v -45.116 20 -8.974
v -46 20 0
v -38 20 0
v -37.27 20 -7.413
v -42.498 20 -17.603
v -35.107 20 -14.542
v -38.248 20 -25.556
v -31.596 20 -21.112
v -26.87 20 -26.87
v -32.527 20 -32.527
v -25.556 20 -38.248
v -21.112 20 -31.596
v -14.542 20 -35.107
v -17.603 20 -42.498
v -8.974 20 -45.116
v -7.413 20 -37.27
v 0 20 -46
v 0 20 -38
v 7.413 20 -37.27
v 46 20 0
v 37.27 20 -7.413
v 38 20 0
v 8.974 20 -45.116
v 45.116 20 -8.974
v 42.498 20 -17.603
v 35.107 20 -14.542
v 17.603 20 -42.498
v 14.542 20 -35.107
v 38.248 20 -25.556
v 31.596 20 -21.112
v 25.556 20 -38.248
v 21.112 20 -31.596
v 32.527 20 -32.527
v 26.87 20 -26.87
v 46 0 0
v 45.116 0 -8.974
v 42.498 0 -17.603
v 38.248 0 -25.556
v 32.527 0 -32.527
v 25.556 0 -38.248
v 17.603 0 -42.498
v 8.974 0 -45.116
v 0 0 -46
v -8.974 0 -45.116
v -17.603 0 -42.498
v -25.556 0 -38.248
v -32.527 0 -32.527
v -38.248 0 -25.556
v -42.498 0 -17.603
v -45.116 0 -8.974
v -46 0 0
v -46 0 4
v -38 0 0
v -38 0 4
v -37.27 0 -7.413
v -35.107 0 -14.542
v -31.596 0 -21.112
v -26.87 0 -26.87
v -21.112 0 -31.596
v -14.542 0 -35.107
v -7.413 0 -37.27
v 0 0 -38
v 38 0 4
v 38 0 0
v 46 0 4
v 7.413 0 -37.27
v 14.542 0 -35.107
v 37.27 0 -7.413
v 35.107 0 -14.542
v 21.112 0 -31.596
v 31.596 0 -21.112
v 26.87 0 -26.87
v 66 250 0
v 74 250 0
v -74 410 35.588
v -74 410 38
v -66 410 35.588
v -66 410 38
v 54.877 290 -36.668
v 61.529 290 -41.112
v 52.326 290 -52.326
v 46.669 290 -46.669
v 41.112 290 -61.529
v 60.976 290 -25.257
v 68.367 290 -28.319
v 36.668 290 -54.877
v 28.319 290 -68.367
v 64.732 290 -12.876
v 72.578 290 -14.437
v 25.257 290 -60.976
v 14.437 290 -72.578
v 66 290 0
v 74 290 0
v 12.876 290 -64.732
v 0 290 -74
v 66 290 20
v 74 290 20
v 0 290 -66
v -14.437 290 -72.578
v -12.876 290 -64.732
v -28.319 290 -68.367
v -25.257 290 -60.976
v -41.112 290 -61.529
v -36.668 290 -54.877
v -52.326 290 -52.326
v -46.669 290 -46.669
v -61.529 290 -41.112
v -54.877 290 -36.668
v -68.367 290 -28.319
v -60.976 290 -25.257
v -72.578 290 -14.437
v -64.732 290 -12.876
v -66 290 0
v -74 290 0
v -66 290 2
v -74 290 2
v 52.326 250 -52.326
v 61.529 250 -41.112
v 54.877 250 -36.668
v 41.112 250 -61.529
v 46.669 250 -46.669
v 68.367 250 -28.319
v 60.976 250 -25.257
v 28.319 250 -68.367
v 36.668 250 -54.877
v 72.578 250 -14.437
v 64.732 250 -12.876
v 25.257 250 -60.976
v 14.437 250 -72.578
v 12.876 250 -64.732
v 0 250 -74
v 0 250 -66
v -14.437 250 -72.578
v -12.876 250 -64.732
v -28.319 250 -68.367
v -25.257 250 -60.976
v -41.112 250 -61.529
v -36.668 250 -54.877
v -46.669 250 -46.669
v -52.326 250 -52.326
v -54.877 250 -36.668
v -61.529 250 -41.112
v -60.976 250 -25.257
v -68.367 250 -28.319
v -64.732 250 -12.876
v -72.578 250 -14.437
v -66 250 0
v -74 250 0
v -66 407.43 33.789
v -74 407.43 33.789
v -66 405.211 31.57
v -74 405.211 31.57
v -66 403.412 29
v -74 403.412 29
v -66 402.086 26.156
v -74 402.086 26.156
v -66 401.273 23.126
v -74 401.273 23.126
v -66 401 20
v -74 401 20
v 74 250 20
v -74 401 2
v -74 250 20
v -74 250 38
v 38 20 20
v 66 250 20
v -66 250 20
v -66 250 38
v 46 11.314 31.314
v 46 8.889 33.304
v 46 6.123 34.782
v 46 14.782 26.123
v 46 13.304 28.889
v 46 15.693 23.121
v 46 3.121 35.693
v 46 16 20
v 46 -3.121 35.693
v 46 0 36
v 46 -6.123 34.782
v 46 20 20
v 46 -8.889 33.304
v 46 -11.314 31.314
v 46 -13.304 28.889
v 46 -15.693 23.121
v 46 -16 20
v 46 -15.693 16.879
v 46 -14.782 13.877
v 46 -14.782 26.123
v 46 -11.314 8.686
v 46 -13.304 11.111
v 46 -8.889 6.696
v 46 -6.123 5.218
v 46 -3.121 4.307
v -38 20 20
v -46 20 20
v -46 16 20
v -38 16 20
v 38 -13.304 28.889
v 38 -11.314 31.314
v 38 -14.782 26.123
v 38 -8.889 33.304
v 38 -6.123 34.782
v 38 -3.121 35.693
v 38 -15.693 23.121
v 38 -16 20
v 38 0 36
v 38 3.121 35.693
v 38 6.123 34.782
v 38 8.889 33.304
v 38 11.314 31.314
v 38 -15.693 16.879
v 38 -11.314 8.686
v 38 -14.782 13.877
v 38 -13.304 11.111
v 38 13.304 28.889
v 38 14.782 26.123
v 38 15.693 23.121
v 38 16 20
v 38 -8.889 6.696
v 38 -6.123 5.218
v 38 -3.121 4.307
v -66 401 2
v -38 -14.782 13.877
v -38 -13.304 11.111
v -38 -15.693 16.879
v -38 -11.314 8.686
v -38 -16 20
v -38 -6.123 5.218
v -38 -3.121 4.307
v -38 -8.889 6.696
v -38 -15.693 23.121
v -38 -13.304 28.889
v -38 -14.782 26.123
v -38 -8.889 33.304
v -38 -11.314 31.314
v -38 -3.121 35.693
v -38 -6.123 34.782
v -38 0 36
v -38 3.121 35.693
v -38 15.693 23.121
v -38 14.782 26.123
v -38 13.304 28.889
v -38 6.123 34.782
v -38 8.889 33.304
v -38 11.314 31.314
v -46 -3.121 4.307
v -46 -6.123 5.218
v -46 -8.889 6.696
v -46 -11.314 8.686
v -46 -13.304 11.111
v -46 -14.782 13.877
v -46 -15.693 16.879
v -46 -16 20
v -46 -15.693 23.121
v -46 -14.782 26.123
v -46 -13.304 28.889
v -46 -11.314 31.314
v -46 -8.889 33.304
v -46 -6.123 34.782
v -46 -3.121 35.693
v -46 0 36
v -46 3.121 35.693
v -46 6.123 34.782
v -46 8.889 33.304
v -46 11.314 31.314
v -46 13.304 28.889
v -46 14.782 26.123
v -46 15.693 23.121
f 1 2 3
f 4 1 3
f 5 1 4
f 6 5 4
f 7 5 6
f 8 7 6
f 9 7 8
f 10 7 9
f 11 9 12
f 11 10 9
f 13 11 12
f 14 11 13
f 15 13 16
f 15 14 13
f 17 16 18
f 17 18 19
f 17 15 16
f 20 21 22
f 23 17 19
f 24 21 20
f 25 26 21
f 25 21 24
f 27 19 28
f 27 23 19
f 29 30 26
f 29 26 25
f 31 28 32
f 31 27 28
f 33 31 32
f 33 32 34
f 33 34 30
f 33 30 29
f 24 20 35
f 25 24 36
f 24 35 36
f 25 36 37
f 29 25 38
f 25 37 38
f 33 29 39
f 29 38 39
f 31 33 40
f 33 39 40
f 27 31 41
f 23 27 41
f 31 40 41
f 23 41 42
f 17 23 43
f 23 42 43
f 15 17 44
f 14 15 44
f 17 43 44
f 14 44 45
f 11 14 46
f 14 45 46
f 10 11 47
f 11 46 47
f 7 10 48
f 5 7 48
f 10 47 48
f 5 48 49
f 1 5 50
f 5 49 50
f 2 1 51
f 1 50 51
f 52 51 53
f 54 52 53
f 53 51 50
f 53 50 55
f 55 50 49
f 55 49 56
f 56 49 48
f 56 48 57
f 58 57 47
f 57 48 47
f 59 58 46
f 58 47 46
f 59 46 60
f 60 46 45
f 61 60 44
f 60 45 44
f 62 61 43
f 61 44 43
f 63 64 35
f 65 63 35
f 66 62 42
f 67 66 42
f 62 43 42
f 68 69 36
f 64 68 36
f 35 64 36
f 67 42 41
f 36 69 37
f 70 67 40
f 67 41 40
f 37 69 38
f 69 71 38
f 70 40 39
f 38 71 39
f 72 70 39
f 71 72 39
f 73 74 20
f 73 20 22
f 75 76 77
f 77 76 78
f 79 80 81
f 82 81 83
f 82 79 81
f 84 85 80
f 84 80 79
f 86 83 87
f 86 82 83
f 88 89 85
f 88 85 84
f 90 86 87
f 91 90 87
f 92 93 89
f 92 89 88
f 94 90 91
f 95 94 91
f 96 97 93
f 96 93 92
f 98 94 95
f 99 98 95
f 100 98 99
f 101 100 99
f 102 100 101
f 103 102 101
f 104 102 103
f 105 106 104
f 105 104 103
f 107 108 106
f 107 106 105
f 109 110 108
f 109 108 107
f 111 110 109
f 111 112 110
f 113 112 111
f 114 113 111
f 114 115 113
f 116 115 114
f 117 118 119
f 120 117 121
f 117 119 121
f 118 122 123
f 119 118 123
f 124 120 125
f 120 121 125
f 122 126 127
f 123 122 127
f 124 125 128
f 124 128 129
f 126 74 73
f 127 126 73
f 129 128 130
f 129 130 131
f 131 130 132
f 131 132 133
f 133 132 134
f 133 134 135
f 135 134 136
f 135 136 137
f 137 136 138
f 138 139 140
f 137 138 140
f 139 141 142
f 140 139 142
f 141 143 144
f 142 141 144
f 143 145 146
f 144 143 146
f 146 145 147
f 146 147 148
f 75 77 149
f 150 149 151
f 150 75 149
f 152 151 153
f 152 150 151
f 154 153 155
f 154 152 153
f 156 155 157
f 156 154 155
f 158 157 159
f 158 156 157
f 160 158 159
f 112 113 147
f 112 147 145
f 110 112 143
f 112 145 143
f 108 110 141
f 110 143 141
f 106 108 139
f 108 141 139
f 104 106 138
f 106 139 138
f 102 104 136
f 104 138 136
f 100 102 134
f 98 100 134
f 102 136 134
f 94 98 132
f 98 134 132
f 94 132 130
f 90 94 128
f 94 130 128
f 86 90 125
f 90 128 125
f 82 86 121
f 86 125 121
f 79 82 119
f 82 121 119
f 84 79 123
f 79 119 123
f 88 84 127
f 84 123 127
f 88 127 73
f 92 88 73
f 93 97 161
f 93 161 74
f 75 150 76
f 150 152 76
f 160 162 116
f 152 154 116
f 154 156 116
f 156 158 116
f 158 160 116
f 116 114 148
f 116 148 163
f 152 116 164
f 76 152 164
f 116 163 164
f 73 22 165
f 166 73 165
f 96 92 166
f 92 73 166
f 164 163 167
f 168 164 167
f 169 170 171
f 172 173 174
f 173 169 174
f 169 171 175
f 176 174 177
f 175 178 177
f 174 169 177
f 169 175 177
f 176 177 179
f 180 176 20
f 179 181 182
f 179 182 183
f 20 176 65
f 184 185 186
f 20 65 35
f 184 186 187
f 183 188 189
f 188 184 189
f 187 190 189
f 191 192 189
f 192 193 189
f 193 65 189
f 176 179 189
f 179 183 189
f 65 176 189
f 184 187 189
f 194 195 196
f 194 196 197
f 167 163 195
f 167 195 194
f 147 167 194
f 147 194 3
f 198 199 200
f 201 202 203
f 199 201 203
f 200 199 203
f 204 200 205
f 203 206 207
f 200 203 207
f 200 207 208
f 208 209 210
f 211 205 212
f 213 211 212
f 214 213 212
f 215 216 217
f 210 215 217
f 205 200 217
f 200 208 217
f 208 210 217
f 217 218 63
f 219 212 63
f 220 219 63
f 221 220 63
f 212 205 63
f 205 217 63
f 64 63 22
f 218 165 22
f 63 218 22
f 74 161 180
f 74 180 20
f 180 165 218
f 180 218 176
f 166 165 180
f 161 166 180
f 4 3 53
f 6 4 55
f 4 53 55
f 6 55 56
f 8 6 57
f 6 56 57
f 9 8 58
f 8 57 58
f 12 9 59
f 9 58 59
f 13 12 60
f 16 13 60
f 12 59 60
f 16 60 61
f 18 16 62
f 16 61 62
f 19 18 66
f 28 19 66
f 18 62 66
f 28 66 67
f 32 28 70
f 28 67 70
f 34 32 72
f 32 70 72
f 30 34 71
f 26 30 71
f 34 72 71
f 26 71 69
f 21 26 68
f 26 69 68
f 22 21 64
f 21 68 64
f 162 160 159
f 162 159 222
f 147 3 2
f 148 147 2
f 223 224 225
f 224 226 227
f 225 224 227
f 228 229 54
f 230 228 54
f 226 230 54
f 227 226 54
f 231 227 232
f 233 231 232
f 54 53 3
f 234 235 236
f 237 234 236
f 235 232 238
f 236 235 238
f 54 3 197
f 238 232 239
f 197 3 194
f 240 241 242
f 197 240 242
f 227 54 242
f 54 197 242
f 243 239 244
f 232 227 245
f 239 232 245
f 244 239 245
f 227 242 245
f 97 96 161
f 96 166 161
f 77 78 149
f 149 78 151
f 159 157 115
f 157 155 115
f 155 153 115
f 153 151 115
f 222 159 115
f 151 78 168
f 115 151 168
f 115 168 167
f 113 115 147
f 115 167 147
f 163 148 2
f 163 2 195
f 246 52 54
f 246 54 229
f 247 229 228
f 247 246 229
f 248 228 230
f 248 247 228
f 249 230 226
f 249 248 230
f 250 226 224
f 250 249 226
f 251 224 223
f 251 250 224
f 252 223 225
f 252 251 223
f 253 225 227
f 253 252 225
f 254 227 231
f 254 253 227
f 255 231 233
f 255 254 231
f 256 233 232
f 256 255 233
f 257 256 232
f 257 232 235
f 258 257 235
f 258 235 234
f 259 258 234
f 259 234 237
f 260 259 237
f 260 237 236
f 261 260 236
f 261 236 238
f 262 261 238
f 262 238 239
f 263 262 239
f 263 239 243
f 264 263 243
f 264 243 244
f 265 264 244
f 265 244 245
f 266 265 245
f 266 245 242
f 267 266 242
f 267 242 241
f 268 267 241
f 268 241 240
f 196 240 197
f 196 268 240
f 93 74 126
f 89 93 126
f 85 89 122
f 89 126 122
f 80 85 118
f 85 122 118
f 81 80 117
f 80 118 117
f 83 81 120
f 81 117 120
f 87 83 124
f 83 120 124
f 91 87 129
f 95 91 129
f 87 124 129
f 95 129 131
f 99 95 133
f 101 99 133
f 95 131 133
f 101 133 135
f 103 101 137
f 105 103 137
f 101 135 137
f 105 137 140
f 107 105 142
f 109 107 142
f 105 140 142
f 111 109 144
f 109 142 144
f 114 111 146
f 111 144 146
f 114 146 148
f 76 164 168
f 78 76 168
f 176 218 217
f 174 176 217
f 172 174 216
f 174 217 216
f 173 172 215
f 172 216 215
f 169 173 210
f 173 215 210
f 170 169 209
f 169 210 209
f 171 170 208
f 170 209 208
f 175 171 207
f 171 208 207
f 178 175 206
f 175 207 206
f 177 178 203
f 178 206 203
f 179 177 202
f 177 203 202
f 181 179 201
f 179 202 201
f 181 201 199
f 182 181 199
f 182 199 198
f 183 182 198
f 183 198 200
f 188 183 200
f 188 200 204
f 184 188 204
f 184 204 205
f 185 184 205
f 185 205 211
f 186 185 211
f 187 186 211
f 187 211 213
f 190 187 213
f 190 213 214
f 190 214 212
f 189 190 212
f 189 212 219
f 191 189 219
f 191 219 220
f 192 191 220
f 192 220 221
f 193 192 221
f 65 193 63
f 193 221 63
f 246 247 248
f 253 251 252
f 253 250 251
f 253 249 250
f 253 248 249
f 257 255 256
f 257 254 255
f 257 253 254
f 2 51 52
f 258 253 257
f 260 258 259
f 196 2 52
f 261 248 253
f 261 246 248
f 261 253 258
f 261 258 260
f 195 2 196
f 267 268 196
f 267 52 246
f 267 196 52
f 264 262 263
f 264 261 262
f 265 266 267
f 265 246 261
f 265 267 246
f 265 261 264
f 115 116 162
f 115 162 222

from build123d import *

# Parameters (mm, degrees)
EXTRUDE_1_DEPTH     = 20
SKETCH_3_R          = 16
EXTRUDE_2_DEPTH     = 8
EXTRUDE_START       = -8
SKETCH_4_R          = 16
EXTRUDE_3_DEPTH     = 8
EXTRUDE_4_DEPTH     = 20
SKETCH_5_W          = 8
SKETCH_5_H          = 20
SKETCH_7_W          = 8
SKETCH_7_H          = 20
SKETCH_10_W         = 8
SKETCH_10_H         = 36
EXTRUDE_5_DEPTH     = 160
CUT_EXTRUDE_3_DEPTH = 160


with BuildPart() as part:
    # 草图2 → 凸台-拉伸1 (new body)
    with BuildSketch(Plane(origin=(0, 0, 0), x_dir=(1, 0, 0), z_dir=(0, 1, 0))):
        with BuildLine():
            Line((-46, 0), (-46, -20))
            Line((-46, -20), (-38, -20))
            Line((-38, -20), (-38, 0))
            ThreePointArc((-38, 0), (0, 38), (38, 0))
            Line((38, 0), (38, -20))
            Line((38, -20), (46, -20))
            Line((46, -20), (46, 0))
            ThreePointArc((46, 0), (0, 46), (-46, 0))
        make_face()
    extrude(amount=EXTRUDE_1_DEPTH)

    # 草图3 → 凸台-拉伸2 (add)
    with BuildSketch(Plane.ZY.offset(46)):
        with Locations((20, 0)):
            Circle(SKETCH_3_R)
    extrude(amount=-EXTRUDE_2_DEPTH)

    # 草图4 → 凸台-拉伸3 (add)
    with BuildSketch(Plane(origin=(46, 0, 0), x_dir=(0, 0, -1), z_dir=(1, 0, 0)).offset(EXTRUDE_START)):
        with Locations((-20, 0)):
            Circle(SKETCH_4_R)
    extrude(amount=EXTRUDE_3_DEPTH)



with BuildPart() as body_2:
    # Sketch 3D_1 → 凸台-拉伸4 (new, symmetric)
    with BuildSketch(Plane(origin=(-74, 270, 0), x_dir=(0.9909924304103234, 0, 0.13391789600139506), z_dir=(0, -1, 0))):
        with BuildLine():
            Line((0, 0), (2.67835792, 19.819848608))
            Line((2.67835792, 19.819848608), (10.606297363, 18.74850544))
            Line((10.606297363, 18.74850544), (7.927939443, -1.071343168))
            ThreePointArc((7.927939443, -1.071343168), (64.494858714, -75.315424711), (138.738940257, -18.74850544))
            Line((138.738940257, -18.74850544), (141.417298177, 1.071343168))
            Line((141.417298177, 1.071343168), (149.345237621, 0))
            Line((149.345237621, 0), (146.666879701, -19.819848608))
            ThreePointArc((146.666879701, -19.819848608), (63.423515546, -83.243364154), (0, 0))
        make_face()
    extrude(amount=EXTRUDE_4_DEPTH, both=True)


with BuildPart() as part_1:
    add(part.part)

    add(body_2.part)  # 扫描1 merges body 2
    # 扫描1: sweep along a path in 草图6
    with BuildLine(Plane.XY.offset(20)) as sweep_1_path:
        Line((46, 20), (74, 250))
    # 草图5 → 扫描1 (sweep)
    with BuildSketch(Plane(origin=(0, 20, 0), x_dir=(1, 0, 0), z_dir=(0, 1, 0))):
        with Locations((42, -10)):
            Rectangle(SKETCH_5_W, SKETCH_5_H)
    sweep(path=sweep_1_path.line)

    # 扫描2: sweep along a path in 草图8
    with BuildLine(Plane.XY.offset(20)) as sweep_2_path:
        Line((-46, 20), (-74, 250))
    # 草图7 → 扫描2 (sweep)
    with BuildSketch(Plane(origin=(0, 20, 0), x_dir=(1, 0, 0), z_dir=(0, 1, 0))):
        with Locations((-42, -10)):
            Rectangle(SKETCH_7_W, SKETCH_7_H)
    sweep(path=sweep_2_path.line)

    # 草图10 → 凸台-拉伸5 (add)
    with BuildSketch(Plane.XZ.offset(-250)):
        with Locations((-70, 20)):
            Rectangle(SKETCH_10_W, SKETCH_10_H)
    extrude(amount=-EXTRUDE_5_DEPTH)

    # 草图12 → 切除-拉伸3 (cut)
    with BuildSketch(Plane.ZY.offset(74)):
        with BuildLine():
            Line((20, 401), (2, 401))
            Line((2, 401), (2, 419))
            ThreePointArc((2, 419), (32.727922061, 431.727922061), (20, 401))
        make_face()
    extrude(amount=-CUT_EXTRUDE_3_DEPTH, mode=Mode.SUBTRACT)


solid = part_1.part
